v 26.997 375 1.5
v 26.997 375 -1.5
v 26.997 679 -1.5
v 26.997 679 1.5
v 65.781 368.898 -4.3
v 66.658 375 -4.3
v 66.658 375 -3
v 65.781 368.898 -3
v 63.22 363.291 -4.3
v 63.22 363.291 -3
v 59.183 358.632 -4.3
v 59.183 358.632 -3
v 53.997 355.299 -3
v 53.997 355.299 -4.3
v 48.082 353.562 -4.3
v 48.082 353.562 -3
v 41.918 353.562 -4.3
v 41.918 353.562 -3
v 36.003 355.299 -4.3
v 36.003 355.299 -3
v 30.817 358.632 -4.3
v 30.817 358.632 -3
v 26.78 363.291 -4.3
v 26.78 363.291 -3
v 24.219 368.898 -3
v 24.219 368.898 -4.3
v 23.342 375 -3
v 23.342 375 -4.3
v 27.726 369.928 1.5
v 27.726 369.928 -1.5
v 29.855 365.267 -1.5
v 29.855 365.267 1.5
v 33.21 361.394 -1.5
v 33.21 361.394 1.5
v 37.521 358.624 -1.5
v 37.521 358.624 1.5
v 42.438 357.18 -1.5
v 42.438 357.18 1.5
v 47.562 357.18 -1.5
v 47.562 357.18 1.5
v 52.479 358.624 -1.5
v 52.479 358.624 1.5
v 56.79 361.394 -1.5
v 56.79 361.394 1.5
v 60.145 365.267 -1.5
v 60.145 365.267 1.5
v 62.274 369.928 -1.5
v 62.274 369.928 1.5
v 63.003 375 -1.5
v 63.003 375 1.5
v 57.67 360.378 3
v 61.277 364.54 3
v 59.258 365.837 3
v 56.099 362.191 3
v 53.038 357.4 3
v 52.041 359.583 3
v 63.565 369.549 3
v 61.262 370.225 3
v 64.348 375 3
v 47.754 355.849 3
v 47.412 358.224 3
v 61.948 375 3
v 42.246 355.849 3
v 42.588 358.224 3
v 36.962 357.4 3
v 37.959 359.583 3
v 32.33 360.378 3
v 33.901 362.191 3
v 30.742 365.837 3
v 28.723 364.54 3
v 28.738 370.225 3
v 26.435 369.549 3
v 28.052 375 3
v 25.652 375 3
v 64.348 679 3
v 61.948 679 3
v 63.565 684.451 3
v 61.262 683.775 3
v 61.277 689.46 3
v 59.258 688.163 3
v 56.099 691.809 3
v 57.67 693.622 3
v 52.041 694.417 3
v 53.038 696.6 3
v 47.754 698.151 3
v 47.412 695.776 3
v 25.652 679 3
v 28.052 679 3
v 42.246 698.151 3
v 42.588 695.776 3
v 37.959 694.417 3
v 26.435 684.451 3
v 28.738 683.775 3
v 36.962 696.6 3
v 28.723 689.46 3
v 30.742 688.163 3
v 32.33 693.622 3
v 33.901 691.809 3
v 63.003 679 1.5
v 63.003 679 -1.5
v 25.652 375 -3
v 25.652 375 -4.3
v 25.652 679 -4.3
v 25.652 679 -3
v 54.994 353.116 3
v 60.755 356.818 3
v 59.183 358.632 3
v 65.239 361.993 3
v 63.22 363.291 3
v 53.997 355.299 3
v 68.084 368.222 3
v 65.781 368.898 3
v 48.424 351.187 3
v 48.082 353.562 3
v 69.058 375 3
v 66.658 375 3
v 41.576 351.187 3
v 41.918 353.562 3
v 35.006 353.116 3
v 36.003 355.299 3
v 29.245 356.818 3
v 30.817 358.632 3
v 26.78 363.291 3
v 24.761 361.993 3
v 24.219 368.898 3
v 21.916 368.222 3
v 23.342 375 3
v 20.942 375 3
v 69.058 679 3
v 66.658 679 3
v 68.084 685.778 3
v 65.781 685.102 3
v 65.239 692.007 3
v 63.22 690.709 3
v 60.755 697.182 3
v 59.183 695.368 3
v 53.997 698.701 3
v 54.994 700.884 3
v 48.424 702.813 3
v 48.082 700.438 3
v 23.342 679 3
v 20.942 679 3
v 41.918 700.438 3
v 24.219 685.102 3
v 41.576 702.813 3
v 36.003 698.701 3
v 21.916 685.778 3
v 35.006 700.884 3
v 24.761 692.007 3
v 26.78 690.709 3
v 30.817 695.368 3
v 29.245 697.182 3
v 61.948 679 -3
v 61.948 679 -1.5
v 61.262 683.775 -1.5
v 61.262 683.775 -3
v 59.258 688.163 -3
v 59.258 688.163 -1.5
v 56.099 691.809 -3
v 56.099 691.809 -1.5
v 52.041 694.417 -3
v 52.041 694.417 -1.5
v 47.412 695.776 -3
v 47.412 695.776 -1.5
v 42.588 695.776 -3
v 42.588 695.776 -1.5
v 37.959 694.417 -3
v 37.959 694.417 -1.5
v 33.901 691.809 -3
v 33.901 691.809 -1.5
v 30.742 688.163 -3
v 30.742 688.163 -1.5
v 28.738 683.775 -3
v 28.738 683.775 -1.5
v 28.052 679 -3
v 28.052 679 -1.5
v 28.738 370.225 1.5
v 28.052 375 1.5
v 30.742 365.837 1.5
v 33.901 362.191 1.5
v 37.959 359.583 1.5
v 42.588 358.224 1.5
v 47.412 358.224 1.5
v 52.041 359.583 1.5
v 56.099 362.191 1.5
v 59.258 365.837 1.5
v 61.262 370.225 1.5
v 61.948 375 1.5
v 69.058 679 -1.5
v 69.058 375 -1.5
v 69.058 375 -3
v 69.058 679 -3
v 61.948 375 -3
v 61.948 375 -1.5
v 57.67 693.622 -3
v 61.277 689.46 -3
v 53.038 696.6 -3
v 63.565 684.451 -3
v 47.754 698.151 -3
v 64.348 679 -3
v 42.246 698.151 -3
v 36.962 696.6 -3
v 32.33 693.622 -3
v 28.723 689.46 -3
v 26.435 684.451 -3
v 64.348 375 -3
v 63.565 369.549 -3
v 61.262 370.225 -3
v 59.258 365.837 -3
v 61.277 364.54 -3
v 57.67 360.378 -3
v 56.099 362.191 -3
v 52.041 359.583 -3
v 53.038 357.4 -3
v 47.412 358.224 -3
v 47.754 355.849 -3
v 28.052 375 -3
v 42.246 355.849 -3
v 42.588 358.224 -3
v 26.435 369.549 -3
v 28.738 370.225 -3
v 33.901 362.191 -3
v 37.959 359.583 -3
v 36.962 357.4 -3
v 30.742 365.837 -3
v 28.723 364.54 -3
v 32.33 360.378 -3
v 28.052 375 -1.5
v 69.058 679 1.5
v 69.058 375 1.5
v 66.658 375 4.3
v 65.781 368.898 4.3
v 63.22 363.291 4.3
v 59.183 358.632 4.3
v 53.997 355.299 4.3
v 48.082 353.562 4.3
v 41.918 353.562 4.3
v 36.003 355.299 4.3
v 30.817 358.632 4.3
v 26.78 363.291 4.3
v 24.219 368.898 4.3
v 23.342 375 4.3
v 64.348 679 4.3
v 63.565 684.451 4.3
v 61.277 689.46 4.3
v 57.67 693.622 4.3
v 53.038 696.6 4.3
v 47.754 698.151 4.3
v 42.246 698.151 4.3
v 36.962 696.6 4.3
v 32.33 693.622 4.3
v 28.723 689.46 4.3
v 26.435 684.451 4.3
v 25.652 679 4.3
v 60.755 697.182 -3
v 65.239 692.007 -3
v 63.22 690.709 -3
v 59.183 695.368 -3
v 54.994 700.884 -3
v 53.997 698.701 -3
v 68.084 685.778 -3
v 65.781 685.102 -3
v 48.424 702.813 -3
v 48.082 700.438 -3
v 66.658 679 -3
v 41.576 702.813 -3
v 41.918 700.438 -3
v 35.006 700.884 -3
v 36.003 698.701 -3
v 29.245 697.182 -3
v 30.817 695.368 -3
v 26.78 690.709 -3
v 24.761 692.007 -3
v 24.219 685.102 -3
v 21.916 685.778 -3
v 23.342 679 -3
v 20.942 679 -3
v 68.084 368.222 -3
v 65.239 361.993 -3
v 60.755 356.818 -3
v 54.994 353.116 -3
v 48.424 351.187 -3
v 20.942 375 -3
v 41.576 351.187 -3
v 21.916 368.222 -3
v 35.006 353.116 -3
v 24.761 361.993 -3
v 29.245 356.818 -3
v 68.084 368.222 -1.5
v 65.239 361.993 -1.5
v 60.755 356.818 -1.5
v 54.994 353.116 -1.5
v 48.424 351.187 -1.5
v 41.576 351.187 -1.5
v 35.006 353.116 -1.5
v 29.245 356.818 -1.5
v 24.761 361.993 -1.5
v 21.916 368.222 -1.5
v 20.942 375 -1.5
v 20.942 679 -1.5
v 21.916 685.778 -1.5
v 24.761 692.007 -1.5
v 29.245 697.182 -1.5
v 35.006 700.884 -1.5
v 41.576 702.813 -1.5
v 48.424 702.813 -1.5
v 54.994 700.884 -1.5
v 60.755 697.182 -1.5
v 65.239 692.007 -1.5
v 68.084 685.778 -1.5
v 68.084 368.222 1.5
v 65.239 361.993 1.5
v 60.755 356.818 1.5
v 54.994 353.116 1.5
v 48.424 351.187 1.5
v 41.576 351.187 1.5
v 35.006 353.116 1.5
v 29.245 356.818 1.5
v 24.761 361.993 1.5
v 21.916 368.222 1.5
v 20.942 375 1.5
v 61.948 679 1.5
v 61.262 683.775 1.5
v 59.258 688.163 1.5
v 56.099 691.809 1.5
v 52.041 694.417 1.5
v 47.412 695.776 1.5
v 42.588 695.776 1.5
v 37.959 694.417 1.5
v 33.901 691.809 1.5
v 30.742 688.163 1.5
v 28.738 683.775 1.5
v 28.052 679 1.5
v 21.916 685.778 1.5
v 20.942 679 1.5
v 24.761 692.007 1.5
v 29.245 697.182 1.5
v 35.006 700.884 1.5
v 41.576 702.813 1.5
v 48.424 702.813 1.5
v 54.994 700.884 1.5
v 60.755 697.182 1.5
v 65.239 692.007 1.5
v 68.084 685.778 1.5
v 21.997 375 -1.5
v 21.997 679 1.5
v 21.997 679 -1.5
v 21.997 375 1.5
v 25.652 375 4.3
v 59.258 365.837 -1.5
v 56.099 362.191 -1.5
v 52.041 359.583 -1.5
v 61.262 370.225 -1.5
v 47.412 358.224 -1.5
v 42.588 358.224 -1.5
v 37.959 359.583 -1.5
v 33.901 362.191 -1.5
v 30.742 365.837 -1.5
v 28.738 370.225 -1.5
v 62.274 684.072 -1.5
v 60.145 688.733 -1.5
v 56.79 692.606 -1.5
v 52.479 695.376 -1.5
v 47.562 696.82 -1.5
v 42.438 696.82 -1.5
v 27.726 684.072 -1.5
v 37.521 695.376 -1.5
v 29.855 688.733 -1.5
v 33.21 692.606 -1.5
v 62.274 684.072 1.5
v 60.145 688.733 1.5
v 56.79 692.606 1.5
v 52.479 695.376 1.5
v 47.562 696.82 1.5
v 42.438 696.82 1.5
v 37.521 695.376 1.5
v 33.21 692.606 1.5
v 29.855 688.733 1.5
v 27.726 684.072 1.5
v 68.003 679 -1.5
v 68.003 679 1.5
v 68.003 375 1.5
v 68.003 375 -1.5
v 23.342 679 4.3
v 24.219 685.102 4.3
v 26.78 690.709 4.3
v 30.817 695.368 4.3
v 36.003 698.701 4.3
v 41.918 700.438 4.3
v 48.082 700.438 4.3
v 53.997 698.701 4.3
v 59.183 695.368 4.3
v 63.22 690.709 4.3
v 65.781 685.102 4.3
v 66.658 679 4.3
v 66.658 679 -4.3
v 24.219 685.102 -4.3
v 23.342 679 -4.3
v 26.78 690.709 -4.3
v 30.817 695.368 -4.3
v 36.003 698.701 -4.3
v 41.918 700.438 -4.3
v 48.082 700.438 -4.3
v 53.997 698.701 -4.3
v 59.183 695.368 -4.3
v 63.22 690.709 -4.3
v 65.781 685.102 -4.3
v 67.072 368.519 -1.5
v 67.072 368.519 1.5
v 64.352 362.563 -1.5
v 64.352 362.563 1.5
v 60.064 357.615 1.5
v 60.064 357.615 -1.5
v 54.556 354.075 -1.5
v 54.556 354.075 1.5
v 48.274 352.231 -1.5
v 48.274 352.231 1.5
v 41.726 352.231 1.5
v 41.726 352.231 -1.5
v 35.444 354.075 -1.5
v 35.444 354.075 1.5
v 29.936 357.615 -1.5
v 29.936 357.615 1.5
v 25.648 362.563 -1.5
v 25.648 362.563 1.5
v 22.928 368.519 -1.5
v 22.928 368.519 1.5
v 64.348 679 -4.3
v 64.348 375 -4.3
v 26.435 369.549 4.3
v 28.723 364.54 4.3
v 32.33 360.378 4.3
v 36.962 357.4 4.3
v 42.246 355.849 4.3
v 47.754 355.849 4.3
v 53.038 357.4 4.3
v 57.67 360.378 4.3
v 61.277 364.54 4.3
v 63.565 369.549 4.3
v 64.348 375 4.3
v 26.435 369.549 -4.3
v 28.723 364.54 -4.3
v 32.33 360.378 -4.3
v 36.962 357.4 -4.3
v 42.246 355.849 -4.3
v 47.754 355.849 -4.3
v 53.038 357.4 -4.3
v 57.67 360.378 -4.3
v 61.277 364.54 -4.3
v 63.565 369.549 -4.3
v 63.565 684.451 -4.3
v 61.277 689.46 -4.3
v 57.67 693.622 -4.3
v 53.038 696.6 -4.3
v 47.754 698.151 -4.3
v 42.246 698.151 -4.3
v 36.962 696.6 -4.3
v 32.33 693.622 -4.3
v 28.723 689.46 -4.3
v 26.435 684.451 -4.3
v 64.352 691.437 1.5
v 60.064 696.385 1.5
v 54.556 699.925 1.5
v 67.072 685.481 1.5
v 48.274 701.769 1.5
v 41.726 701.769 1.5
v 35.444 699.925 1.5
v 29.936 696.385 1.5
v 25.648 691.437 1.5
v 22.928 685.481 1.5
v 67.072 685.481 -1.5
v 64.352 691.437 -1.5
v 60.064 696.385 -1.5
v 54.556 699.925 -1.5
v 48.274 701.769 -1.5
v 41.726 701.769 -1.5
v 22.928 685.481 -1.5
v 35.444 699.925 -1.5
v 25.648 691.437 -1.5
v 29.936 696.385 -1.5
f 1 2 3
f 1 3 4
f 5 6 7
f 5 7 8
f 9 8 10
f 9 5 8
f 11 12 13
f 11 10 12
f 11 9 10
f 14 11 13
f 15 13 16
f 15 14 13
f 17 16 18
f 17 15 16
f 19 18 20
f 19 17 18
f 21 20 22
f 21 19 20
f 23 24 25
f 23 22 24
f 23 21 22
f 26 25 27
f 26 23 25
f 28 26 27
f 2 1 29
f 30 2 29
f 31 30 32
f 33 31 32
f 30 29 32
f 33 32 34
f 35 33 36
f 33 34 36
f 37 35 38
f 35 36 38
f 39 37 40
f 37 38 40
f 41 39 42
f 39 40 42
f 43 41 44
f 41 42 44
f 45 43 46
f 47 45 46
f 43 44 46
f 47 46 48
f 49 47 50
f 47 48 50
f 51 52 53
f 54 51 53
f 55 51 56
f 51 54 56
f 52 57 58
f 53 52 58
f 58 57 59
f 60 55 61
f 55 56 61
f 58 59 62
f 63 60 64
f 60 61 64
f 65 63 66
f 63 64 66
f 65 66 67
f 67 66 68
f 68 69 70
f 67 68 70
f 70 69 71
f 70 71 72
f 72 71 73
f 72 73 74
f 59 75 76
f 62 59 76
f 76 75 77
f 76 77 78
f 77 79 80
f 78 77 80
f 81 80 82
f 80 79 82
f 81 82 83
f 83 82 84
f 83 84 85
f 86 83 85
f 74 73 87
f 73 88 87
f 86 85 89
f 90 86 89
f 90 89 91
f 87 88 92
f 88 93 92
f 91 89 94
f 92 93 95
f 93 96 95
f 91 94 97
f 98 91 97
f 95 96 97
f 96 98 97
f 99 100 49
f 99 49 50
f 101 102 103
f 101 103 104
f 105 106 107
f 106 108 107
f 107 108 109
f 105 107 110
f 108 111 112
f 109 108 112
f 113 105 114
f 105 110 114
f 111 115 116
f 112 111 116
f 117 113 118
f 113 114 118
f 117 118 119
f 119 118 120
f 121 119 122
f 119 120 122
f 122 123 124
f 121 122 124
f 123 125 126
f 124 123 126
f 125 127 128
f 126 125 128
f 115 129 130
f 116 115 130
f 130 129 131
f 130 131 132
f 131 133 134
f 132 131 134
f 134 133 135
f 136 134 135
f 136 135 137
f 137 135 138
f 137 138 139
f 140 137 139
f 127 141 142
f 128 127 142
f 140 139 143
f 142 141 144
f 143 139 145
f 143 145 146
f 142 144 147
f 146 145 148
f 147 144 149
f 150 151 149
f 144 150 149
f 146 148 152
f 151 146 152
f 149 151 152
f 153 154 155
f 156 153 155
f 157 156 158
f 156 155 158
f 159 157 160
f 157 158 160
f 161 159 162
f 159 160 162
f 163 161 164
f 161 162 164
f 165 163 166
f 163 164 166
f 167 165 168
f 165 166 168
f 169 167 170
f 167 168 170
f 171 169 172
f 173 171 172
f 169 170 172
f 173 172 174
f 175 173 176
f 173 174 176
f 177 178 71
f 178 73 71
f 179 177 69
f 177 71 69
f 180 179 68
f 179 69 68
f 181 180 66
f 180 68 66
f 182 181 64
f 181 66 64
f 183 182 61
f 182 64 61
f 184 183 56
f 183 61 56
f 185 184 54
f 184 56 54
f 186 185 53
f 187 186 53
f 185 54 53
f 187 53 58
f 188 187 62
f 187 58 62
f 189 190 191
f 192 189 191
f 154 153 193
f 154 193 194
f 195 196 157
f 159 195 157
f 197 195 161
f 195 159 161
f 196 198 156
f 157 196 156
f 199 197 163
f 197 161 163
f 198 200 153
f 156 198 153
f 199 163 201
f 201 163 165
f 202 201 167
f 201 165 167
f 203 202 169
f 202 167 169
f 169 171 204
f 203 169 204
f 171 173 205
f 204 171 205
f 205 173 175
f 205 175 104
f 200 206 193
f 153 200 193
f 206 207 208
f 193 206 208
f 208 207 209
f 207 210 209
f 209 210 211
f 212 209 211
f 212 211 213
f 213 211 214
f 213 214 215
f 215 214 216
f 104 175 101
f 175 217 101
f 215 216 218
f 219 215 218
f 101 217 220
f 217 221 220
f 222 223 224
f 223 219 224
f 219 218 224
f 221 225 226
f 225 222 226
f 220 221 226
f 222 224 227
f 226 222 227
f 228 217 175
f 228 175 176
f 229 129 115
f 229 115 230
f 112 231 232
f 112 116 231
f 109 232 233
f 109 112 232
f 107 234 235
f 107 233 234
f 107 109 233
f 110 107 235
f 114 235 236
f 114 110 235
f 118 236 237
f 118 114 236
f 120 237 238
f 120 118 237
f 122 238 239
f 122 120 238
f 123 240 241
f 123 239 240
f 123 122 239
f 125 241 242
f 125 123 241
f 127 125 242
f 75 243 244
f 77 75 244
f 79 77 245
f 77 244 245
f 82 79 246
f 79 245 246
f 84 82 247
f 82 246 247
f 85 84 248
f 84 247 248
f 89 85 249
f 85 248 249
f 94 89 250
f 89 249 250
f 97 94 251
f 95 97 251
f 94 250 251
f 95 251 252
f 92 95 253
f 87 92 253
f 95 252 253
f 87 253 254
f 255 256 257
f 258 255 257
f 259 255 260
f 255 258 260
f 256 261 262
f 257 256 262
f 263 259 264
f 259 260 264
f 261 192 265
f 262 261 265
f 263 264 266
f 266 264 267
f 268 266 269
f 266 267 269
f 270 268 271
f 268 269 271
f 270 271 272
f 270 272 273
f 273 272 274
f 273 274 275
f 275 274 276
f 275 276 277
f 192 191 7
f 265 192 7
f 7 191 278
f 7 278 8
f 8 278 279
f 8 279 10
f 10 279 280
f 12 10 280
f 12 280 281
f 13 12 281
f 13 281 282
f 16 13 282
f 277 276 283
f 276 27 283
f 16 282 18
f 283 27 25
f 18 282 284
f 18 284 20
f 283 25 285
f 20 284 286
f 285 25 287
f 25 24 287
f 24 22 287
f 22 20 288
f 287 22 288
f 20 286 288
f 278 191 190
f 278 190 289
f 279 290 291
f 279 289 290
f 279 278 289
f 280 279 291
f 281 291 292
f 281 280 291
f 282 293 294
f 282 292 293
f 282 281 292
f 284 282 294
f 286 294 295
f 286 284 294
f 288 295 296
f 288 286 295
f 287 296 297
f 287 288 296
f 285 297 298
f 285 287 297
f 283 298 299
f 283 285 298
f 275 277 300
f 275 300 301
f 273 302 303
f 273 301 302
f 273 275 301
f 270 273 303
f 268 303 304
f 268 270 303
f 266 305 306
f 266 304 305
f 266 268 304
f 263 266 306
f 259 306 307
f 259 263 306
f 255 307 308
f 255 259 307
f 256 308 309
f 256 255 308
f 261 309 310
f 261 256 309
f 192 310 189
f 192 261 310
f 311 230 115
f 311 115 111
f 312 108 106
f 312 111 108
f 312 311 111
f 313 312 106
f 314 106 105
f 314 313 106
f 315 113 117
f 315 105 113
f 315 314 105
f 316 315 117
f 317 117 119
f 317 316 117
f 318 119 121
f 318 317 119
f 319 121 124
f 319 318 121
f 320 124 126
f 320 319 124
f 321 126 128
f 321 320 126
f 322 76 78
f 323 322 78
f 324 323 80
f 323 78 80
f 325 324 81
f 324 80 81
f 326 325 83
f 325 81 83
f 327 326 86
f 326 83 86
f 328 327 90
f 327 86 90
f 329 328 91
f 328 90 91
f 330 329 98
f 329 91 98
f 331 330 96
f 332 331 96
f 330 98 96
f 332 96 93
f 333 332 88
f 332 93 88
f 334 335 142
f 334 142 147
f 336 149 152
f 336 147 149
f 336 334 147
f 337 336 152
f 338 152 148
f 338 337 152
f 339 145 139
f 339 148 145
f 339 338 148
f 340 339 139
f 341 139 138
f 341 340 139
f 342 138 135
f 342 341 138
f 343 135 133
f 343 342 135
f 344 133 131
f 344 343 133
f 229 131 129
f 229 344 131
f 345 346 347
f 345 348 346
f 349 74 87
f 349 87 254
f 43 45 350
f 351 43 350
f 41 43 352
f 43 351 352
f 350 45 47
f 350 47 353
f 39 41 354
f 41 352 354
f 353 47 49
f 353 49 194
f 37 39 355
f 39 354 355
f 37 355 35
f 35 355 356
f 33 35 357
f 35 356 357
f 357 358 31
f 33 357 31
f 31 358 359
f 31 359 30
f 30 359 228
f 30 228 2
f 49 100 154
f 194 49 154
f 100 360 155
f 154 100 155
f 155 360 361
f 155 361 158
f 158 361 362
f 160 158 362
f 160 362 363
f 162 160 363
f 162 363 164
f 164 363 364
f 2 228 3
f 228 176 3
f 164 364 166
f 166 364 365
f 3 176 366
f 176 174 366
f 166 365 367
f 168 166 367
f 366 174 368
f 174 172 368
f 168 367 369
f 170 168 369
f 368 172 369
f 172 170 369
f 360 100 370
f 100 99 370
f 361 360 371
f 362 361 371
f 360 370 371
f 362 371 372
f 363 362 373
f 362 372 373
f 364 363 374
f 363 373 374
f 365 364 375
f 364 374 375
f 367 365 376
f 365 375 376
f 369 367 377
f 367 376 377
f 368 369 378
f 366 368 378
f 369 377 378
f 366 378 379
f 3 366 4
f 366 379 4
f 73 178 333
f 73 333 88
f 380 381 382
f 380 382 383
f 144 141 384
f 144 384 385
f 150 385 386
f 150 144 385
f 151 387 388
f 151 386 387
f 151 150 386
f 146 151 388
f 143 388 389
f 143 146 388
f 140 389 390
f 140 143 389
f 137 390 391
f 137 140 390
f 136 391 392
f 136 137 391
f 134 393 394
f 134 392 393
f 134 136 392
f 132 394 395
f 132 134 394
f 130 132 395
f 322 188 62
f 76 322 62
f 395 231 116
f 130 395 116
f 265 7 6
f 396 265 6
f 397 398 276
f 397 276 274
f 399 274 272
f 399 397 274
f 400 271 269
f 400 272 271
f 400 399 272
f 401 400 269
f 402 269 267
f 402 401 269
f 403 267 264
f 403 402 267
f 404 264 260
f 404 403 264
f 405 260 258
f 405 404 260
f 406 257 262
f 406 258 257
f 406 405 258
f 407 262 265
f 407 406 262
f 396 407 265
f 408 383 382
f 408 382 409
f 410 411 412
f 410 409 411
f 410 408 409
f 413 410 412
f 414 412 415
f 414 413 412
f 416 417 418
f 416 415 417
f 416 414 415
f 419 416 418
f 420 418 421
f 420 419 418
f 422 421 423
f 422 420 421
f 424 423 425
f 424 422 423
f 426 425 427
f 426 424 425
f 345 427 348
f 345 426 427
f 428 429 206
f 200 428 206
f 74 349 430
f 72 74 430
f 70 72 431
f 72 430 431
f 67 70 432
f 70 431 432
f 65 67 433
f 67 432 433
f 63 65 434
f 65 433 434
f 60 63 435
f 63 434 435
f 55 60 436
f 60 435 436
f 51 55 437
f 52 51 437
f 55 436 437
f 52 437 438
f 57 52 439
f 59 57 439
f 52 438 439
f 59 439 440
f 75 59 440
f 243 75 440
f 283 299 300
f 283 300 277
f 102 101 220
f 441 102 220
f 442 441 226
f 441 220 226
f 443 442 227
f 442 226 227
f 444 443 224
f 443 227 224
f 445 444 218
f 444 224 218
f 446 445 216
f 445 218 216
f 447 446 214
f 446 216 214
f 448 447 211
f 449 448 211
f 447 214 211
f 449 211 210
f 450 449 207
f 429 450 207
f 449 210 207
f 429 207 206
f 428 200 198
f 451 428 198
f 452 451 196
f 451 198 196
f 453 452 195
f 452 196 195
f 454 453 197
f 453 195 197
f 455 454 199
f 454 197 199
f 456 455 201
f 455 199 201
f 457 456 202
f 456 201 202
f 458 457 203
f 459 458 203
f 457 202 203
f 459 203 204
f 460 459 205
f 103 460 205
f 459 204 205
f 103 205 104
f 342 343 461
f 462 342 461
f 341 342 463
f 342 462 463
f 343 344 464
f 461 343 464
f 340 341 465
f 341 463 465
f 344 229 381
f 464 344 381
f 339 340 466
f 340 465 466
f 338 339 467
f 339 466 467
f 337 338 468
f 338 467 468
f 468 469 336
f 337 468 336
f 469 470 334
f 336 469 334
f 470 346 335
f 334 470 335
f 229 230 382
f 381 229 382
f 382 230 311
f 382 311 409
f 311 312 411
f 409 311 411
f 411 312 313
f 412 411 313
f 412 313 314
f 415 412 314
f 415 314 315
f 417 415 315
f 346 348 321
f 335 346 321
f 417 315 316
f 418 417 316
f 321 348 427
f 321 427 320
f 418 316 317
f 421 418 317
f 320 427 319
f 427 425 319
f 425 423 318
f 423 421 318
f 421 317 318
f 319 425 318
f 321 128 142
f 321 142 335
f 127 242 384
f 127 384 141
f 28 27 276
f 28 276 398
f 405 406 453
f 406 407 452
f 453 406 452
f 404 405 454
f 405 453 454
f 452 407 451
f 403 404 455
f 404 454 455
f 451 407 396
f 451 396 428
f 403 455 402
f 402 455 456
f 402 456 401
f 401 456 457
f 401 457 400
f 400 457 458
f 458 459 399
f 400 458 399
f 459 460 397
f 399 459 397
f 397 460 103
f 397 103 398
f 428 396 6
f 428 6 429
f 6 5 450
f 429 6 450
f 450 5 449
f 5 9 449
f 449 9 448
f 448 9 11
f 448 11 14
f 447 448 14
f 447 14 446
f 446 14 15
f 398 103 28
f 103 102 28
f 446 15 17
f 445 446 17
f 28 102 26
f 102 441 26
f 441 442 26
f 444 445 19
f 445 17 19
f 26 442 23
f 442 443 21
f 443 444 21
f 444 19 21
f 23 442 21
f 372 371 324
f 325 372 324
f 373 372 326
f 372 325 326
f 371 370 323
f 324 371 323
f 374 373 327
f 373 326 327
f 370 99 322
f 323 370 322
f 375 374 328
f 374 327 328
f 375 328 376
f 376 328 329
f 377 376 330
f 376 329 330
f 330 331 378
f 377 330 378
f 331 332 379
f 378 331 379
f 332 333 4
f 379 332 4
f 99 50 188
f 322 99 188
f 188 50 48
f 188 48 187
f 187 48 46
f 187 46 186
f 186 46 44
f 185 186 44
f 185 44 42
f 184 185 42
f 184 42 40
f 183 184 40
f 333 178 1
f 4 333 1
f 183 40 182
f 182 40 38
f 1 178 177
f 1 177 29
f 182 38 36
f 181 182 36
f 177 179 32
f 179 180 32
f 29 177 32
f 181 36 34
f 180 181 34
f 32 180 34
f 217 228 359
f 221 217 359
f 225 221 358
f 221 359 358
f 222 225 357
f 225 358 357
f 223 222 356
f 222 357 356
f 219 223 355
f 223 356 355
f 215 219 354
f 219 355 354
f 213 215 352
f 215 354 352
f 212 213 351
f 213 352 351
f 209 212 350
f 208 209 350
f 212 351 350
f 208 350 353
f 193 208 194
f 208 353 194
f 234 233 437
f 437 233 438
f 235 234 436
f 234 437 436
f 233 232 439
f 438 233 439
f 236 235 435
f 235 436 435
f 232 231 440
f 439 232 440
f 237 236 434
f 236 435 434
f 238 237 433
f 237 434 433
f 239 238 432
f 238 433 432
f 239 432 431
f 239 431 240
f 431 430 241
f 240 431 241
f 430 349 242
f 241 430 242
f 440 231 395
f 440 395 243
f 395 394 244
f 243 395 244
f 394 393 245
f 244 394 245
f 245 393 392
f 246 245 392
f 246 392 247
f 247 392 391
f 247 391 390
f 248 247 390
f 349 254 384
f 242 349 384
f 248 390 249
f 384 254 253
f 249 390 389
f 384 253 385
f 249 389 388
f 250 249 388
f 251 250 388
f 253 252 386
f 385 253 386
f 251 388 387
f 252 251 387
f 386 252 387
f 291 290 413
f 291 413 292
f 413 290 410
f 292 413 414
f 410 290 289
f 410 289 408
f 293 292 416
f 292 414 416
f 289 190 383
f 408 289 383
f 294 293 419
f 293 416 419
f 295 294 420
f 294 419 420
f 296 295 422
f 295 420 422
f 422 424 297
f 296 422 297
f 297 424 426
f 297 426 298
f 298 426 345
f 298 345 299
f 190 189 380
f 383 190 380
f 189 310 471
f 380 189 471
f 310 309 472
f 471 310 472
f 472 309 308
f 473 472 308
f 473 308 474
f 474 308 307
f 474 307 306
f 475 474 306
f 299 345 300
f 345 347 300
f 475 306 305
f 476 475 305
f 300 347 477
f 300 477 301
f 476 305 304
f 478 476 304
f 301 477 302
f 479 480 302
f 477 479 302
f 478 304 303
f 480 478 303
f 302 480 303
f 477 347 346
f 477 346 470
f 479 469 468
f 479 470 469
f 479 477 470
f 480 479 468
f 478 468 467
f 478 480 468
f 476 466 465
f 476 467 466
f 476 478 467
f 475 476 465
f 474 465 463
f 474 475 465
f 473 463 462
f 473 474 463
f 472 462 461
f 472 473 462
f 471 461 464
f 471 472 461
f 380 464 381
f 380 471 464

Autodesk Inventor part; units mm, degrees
ref_plane "Work Plane2" through (45, 375, 0) normal (-1, 0, 0) x (0, 0, 1)
ref_plane "Work Plane3" through (45, 679, 0) normal (0, -1, 0) x (0, 0, 1)
sketch "Path" plane through (0, 0, 0) normal (0, 0, 1) x (1, 0, 0)
  arc A0 (24.4967, 375) -> (65.5033, 375) centre (45, 375) ccw
  arc A1 (65.5033, 679) -> (24.4967, 679) centre (45, 679) ccw
  line L0 (65.5033, 679) -> (65.5033, 375)
  line L1 (24.4967, 375) -> (24.4967, 679)
ref_plane "Section Plane" through (65.5033, 375, 0) normal (0, 1, 0) x (0, 0, 1)
sketch "Section Sketch" plane through (65.5033, 375, 0) normal (0, 1, 0) x (0, 0, 1)
  line L0 (-4.3, -1.155) -> (4.3, -1.155)
  line L1 (4.3, -1.155) -> (4.3, 1.155)
  line L2 (4.3, 1.155) -> (-4.3, 1.155)
  line L3 (-4.3, 1.155) -> (-4.3, -1.155)
  line L4 (-1.5, -2.5) -> (1.5, -2.5)
  line L5 (1.5, -2.5) -> (1.5, 2.5)
  line L6 (1.5, 2.5) -> (-1.5, 2.5)
  line L7 (-1.5, 2.5) -> (-1.5, -2.5)
  line L8 (-1.5, 0) -> (1.5, 0) construction
  line L9 (-3, -3.555) -> (-1.5, -3.555)
  line L10 (-1.5, -3.555) -> (-1.5, 3.555)
  line L11 (-1.5, 3.555) -> (-3, 3.555)
  line L12 (-3, 3.555) -> (-3, -3.555)
  line L13 (1.5, -3.555) -> (3, -3.555)
  line L14 (3, -3.555) -> (3, 3.555)
  line L15 (3, 3.555) -> (1.5, 3.555)
  line L16 (1.5, 3.555) -> (1.5, -3.555)
  line L17 (-4.3, 0) -> (4.3, 0) construction
  point P0 (0, 0)
  point P1 (0, 0)
  dimension "d21" = 2.31
  dimension "d22" = 5
  dimension "d23" = 3
  dimension "d24" = 1.5
  dimension "d31" = 7.11
  dimension "d32" = 8.6
sweep "Solid" add profiles "Section Sketch" path "Path"
pattern_of_one "Strand Pattern"
equation "\"d21\" = da_d2"
equation "\"d22\" = da_d1"
equation "\"d23\" = da_b1"
equation "\"d24\" = da_t1 + da_t2"
equation "\"d30\" = da_pt"
equation "\"da_p\" = 8"
equation "\"da_b1\" = 3"
equation "\"da_h2\" = 7.11"
equation "\"da_h3\" = 7.11"
equation "\"da_d1\" = 5"
equation "\"da_d2\" = 2.31"
equation "\"da_pt\" = 5.64"
equation "\"da_b\" = 8.6"
equation "\"da_t1\" = 0.75"
equation "\"da_t2\" = 0.75"
properties part number "Roller Chain"
